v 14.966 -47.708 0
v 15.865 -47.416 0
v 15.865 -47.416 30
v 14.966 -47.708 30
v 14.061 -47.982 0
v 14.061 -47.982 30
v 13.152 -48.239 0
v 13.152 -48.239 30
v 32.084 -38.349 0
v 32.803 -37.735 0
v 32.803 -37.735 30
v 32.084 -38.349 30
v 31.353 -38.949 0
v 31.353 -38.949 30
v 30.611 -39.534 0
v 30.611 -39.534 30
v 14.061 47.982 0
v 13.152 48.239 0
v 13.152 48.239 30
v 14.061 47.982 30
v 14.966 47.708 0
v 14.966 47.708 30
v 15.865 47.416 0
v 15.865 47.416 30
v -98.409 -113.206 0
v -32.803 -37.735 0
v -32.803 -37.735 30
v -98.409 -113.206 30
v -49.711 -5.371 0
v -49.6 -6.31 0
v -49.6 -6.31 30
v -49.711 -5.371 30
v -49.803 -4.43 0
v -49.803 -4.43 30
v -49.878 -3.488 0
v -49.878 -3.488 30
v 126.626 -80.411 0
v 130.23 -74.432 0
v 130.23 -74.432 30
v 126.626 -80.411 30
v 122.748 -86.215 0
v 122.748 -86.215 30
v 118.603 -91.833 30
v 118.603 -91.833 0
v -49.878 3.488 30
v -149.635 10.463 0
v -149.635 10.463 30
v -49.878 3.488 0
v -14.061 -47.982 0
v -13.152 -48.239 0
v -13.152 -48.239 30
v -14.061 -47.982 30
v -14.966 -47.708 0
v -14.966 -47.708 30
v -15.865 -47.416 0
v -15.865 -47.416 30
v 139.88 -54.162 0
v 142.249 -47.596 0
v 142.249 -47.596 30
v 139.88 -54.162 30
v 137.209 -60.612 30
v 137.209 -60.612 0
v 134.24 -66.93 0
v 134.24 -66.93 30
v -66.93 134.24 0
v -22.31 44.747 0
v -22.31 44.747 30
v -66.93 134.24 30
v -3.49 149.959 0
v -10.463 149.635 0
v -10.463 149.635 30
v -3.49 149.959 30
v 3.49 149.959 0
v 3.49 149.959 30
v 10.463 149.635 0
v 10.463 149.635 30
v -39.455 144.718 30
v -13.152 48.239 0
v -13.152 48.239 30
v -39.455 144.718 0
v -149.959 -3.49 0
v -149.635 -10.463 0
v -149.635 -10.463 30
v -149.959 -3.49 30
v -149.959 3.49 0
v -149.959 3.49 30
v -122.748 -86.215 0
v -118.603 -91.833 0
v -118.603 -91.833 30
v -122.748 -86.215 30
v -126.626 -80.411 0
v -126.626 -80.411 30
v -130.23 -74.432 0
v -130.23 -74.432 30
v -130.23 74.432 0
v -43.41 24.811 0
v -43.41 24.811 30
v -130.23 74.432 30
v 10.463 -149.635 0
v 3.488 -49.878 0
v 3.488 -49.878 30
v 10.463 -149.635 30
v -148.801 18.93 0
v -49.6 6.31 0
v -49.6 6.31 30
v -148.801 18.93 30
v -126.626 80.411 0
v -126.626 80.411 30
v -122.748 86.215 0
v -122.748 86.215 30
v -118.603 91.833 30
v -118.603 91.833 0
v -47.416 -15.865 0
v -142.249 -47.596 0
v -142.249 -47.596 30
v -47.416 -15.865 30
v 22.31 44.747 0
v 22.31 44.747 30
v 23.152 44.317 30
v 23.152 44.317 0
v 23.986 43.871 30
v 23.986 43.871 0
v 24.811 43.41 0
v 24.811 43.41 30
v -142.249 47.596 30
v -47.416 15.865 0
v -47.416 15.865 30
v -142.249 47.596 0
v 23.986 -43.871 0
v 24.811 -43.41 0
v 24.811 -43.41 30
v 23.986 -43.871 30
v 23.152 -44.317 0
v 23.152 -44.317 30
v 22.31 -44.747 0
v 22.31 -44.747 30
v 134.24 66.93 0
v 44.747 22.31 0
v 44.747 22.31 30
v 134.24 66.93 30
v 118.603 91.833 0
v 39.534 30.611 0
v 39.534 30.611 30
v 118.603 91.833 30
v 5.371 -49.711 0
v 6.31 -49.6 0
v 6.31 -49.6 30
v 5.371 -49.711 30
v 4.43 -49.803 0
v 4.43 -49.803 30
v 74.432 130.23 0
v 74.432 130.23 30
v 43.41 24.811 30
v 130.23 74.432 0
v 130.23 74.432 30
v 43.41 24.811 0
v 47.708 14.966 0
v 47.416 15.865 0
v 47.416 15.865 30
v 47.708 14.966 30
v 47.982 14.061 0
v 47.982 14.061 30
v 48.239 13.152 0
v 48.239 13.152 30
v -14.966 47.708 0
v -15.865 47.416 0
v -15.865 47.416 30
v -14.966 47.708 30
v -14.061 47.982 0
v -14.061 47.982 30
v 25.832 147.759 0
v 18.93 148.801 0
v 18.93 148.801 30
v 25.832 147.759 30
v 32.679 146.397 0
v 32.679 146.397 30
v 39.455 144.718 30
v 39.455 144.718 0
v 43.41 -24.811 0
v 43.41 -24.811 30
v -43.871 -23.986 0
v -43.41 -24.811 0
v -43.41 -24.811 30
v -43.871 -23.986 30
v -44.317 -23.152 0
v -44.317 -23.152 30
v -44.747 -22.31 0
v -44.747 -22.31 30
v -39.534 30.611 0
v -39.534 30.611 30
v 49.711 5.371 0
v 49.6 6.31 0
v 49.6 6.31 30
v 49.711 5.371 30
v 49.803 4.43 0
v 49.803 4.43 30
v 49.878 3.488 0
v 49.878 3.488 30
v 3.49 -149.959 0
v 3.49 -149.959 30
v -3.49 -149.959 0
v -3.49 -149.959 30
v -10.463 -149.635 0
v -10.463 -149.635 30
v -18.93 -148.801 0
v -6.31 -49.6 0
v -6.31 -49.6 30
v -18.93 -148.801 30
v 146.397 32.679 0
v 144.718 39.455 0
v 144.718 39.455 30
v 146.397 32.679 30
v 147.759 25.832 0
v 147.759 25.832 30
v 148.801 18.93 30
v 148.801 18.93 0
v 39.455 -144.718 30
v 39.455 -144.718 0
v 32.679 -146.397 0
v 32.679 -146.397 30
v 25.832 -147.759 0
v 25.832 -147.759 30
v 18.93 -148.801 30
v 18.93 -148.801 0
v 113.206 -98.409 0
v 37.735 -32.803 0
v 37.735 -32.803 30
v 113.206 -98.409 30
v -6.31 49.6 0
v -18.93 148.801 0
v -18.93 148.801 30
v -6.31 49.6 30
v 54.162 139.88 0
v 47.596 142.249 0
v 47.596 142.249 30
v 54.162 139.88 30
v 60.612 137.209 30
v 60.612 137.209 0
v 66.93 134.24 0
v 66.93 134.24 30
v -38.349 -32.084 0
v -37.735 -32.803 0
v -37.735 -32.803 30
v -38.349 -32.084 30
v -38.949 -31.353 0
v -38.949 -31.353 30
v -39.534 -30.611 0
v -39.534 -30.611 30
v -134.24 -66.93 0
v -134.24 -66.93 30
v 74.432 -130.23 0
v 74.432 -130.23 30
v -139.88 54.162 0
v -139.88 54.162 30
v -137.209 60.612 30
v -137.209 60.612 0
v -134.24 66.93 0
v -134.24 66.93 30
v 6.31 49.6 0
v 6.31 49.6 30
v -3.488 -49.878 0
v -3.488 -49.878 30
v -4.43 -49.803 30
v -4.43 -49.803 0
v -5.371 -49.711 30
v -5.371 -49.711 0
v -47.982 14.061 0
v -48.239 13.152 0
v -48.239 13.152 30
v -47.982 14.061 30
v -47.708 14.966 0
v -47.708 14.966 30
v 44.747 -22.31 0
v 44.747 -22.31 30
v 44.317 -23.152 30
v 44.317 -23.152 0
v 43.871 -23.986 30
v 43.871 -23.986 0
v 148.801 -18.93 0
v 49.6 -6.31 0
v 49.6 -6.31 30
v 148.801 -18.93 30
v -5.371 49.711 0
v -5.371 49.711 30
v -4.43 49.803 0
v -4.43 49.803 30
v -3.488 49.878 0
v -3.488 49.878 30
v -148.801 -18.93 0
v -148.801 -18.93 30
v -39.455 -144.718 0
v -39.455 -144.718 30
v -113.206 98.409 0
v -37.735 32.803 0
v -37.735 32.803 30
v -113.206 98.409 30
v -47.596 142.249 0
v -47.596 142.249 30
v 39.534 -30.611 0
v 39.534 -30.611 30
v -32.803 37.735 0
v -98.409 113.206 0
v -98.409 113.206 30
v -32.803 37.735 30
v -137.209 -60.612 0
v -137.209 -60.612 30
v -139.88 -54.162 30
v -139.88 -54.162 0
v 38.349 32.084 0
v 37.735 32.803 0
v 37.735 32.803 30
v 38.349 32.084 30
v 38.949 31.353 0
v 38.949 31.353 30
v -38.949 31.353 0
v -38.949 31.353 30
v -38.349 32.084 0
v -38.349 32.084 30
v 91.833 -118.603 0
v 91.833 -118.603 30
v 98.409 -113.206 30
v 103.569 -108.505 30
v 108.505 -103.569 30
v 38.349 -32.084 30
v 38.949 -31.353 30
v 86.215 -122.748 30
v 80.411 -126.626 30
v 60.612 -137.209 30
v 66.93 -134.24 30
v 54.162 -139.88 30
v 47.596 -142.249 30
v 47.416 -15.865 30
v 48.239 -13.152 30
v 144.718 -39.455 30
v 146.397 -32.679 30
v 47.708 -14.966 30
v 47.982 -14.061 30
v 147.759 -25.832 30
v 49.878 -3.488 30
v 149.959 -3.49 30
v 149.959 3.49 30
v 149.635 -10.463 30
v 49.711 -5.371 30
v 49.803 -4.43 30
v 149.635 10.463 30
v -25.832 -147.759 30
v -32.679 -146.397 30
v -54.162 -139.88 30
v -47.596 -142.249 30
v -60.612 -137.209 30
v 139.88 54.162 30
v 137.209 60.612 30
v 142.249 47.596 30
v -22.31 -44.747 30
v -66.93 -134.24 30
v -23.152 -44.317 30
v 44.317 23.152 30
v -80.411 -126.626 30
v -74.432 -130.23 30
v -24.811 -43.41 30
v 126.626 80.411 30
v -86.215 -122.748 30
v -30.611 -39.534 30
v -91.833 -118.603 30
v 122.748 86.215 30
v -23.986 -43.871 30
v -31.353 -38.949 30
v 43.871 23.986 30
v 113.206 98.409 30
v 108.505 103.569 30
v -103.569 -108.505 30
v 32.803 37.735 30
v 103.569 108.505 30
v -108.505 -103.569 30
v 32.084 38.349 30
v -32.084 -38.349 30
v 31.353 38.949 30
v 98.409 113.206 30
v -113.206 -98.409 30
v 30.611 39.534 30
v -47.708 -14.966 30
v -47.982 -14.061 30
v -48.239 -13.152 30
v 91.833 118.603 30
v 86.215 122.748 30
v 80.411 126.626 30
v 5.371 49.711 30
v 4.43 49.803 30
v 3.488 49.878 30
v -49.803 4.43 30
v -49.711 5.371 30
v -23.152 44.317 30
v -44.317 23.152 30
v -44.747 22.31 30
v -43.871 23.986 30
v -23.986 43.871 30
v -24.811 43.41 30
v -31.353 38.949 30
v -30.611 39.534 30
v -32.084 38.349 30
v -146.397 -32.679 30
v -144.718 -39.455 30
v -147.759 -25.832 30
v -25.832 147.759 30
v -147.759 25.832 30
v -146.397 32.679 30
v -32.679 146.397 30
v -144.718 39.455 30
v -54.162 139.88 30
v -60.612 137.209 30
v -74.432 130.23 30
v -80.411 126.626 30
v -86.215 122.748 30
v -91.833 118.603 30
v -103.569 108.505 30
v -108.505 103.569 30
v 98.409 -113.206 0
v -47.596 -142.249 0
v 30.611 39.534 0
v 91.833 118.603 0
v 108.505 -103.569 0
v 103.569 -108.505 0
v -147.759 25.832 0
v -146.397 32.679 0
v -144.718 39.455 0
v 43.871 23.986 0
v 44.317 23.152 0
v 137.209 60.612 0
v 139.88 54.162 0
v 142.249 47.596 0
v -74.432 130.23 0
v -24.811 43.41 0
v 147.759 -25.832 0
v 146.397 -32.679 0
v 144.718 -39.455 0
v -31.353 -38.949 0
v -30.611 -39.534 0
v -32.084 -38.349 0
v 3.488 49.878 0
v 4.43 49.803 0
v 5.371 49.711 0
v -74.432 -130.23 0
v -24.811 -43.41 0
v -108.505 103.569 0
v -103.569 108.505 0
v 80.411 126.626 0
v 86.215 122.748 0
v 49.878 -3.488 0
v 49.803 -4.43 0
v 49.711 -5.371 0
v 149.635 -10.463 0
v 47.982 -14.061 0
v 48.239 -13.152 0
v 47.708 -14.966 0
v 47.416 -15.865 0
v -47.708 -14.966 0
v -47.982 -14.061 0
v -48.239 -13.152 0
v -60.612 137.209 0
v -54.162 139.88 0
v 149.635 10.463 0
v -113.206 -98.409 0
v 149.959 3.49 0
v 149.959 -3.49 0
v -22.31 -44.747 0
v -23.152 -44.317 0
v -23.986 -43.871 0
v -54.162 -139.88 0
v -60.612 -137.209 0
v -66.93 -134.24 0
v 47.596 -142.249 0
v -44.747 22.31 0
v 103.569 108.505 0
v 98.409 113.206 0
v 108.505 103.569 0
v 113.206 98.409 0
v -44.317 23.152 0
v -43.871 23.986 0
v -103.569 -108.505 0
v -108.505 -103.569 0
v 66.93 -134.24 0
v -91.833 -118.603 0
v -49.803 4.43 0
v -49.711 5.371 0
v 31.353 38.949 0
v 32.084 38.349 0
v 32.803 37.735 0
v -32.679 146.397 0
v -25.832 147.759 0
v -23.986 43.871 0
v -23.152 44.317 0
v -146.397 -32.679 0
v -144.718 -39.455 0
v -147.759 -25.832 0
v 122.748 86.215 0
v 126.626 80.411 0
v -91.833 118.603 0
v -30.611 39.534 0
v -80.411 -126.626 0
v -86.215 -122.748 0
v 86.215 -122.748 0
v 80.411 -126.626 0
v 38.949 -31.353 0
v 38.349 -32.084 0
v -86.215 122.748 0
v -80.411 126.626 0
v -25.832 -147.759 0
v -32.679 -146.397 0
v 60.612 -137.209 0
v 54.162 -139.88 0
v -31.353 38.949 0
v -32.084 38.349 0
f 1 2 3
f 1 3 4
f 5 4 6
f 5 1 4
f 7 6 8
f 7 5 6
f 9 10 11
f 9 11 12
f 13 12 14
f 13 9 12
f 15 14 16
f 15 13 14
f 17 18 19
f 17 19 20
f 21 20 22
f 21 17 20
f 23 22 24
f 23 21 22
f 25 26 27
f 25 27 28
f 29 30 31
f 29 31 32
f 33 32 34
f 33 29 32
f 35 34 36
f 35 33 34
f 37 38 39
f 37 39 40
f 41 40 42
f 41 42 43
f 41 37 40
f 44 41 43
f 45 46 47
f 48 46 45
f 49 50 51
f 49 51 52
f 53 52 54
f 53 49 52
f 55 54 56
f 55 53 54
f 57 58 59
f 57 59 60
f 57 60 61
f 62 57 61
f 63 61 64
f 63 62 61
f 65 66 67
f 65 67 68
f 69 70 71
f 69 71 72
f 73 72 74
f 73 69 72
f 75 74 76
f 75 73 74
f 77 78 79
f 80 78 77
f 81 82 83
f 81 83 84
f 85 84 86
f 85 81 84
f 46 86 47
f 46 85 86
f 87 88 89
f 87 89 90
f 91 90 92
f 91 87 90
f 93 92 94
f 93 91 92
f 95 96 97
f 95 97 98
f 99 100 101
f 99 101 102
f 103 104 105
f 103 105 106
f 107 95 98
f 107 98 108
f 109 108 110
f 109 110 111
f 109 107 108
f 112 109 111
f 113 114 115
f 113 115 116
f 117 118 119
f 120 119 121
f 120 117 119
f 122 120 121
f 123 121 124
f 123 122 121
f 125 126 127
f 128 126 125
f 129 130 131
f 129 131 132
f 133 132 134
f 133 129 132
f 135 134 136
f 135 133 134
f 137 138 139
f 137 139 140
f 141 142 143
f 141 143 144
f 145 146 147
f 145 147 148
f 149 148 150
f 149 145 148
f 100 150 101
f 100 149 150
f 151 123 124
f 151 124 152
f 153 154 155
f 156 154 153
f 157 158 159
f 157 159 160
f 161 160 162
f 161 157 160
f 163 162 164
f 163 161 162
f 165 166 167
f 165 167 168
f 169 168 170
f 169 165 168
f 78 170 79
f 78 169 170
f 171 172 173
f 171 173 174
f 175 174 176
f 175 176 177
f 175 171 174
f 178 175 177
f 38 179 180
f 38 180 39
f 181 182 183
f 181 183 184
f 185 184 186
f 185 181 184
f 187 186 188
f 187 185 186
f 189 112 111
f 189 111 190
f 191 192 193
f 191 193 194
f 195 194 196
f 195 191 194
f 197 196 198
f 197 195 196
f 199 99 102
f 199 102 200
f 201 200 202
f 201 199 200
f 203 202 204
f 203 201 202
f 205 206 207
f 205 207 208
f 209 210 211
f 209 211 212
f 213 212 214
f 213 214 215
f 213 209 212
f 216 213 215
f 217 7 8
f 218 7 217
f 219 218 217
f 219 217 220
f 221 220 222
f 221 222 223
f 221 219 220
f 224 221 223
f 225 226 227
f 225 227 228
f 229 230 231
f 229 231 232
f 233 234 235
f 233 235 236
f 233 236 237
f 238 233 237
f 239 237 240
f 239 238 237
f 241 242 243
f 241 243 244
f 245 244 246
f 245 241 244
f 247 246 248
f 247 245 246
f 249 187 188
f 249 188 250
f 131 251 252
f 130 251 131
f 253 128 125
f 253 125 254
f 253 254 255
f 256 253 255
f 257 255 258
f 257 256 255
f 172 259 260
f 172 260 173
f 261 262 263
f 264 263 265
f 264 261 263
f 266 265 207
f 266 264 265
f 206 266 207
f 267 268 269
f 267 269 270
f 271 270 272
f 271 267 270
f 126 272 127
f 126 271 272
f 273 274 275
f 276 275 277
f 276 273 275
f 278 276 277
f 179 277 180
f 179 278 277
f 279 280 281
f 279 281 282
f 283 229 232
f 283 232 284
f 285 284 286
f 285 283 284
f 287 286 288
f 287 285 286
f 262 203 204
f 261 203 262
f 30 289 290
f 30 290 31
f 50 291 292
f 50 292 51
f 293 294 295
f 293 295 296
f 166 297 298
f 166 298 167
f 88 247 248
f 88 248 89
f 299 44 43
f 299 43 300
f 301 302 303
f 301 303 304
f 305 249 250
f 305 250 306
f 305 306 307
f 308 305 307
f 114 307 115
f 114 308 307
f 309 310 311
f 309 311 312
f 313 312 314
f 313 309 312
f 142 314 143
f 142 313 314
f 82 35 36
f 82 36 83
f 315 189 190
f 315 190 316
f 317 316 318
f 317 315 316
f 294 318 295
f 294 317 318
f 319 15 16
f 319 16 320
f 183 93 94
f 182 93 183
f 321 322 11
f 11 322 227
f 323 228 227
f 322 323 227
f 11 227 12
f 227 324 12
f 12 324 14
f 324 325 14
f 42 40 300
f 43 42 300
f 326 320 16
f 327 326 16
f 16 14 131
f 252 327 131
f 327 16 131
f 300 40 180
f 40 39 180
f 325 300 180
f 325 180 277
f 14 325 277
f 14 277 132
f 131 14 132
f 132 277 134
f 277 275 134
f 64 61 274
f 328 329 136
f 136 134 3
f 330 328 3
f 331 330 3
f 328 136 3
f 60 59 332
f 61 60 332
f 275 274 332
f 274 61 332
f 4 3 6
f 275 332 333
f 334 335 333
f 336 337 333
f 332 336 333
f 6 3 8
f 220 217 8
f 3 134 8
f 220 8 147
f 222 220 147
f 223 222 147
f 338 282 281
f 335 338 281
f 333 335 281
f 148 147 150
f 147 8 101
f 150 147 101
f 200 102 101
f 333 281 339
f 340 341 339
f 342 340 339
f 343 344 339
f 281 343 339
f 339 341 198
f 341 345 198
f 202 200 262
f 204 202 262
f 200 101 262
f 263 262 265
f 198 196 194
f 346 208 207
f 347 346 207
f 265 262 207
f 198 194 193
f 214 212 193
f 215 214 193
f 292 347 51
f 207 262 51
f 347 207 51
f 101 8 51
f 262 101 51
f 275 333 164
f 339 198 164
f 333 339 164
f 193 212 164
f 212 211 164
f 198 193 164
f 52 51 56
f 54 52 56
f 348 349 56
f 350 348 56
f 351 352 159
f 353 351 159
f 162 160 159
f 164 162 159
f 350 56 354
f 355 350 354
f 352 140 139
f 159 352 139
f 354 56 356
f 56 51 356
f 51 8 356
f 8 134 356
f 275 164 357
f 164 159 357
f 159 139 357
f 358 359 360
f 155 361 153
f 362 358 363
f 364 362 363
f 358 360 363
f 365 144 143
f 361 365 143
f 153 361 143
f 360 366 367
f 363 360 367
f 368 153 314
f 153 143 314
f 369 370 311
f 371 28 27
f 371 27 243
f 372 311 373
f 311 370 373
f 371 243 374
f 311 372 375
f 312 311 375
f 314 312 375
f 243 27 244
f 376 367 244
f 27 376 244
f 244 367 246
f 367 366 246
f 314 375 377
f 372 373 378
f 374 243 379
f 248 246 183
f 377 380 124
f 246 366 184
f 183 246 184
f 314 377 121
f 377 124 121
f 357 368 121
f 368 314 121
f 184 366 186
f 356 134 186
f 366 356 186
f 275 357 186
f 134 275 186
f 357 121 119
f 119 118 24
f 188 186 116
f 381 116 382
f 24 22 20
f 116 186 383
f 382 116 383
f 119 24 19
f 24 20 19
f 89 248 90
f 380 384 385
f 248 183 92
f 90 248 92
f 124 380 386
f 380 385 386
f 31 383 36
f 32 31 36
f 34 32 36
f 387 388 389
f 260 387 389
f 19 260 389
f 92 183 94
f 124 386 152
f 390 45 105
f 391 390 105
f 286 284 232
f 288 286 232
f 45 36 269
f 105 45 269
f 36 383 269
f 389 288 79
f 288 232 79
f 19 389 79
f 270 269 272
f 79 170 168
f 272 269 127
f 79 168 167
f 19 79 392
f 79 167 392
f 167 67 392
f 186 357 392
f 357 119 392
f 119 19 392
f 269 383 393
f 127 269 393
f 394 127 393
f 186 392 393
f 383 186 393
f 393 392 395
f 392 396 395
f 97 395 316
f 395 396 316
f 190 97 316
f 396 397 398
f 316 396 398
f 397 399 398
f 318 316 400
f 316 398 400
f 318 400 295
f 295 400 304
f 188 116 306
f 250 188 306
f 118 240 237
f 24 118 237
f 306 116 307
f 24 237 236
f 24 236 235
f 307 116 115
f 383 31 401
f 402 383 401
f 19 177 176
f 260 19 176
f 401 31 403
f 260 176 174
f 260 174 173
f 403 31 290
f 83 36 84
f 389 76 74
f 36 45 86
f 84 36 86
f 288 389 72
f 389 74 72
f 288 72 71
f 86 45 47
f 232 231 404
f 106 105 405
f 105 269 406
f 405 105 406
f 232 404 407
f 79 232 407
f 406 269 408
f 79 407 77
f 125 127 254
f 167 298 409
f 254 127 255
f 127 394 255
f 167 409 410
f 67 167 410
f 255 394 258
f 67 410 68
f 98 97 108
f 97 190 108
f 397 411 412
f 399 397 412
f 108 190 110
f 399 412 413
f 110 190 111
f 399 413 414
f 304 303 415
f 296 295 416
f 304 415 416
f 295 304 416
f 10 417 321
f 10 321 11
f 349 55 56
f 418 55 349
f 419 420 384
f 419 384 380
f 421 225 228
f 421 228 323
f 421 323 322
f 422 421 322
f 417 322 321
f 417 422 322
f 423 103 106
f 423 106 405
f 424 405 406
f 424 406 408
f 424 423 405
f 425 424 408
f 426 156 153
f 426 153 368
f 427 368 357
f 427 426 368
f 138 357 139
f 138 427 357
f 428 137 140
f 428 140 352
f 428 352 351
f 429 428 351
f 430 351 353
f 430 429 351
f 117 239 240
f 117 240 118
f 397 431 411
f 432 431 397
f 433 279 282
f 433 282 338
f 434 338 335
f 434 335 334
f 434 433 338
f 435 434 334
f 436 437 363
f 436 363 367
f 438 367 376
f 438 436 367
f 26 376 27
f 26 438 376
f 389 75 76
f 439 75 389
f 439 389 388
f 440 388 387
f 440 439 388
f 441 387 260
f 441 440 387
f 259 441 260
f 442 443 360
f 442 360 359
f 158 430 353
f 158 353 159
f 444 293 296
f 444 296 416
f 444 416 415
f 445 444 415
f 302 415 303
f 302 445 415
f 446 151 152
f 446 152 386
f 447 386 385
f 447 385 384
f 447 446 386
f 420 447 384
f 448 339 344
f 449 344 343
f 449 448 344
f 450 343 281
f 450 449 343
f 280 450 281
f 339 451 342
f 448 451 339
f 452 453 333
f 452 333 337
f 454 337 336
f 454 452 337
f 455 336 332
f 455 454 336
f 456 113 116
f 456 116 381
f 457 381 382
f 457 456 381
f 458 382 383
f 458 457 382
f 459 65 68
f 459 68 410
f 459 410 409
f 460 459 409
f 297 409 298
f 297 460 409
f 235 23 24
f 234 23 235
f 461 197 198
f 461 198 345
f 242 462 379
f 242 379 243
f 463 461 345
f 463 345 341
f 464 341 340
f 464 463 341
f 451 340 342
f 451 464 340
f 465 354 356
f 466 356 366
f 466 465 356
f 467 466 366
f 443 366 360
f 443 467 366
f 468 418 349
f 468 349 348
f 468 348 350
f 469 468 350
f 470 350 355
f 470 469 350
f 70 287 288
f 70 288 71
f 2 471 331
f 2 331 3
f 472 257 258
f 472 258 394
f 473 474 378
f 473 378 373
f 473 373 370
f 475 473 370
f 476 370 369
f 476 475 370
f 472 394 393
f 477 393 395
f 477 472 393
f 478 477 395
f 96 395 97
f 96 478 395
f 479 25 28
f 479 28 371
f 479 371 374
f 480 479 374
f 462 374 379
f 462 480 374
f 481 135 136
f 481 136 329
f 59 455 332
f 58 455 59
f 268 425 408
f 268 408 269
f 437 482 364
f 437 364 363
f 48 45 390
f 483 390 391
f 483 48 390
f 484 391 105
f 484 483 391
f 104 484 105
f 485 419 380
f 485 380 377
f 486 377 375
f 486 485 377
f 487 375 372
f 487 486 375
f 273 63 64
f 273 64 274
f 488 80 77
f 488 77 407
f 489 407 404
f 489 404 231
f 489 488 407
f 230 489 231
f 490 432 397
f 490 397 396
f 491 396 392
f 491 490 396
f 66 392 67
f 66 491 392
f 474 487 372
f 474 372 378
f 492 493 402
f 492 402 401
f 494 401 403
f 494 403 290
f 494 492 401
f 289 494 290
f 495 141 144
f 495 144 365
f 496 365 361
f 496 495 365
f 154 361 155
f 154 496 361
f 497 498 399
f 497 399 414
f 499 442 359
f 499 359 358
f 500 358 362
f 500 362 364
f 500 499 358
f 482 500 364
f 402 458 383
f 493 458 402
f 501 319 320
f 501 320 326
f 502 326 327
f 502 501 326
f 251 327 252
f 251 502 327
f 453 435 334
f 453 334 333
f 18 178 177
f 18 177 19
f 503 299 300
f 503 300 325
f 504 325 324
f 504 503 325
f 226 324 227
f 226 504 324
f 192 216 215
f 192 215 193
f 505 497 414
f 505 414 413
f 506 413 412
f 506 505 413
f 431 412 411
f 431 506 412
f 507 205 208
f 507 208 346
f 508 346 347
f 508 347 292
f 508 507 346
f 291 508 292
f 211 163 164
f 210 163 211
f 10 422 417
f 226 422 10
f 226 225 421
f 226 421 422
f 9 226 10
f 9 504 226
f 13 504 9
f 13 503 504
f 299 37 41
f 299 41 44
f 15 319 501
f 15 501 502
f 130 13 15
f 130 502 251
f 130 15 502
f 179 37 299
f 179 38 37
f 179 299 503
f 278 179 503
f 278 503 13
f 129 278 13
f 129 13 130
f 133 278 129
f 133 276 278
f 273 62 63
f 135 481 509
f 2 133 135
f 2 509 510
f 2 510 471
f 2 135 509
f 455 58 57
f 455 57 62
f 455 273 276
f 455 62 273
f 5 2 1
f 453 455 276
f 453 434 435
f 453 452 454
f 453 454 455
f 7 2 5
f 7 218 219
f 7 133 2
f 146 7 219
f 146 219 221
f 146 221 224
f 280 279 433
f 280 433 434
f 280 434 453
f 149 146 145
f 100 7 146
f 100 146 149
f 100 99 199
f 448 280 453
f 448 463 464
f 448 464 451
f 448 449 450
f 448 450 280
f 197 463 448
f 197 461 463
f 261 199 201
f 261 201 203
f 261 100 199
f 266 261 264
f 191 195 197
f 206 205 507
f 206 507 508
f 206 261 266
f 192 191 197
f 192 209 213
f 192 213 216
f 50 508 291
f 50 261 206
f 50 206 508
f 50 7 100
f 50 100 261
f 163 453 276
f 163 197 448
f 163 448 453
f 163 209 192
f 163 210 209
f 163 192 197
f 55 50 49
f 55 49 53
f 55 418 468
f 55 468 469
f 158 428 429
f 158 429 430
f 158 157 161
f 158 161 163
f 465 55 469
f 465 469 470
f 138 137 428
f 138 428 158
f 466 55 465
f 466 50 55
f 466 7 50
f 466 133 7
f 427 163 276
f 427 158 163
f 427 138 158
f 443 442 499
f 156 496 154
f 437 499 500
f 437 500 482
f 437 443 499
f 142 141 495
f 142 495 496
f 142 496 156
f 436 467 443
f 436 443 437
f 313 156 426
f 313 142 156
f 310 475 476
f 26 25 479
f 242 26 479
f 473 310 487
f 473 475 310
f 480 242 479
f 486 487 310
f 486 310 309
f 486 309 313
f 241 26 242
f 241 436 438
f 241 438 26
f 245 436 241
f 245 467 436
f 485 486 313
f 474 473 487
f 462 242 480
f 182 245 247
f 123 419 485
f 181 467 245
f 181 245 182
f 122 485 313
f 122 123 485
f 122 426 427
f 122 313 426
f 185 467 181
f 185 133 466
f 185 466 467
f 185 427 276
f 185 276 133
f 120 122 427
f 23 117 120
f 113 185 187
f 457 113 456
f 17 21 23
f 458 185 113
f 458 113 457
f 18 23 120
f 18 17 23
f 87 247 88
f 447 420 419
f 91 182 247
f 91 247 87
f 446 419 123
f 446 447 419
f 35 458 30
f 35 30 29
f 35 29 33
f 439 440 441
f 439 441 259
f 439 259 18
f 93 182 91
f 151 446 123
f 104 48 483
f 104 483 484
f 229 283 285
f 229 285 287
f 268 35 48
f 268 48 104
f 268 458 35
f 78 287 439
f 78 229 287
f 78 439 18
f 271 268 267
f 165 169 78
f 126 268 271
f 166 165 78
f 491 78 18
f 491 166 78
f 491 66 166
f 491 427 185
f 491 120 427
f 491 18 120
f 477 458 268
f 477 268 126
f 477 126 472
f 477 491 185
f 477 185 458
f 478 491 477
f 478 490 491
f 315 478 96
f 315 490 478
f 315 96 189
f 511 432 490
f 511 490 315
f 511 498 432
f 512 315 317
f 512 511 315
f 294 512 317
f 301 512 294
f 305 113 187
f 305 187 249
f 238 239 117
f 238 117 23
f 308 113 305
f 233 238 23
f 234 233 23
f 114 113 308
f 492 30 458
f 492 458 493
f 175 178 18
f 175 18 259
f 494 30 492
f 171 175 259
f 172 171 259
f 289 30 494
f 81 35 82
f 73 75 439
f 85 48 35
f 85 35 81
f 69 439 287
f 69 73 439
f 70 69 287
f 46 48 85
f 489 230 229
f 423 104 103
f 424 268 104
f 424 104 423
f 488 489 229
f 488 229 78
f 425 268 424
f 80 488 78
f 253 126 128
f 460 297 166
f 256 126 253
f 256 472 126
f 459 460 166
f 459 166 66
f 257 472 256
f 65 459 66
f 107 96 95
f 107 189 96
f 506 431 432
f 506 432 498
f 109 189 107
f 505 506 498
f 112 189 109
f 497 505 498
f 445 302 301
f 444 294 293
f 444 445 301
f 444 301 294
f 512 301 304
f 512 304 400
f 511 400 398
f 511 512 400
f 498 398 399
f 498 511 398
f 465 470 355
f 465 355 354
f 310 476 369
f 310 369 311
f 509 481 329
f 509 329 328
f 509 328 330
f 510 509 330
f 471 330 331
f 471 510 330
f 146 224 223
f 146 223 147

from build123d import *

# Parameters (mm, degrees)
BOSS_EXTRUDE1_DEPTH = 30


with BuildPart() as part:
    # Sketch1 → Boss-Extrude1 (new body)
    with BuildSketch(Plane.XY):
        with BuildLine():
            Line((-3.487823687, 49.878202513), (-10.463471062, 149.634607539))
            ThreePointArc((-10.463471062, 149.634607539), (0, 150), (10.463471062, 149.634607539))
            Line((10.463471062, 149.634607539), (3.487823687, 49.878202513))
            ThreePointArc((3.487823687, 49.878202513), (4.900857016, 49.759236334), (6.309948457, 49.600247484))
            Line((6.309948457, 49.600247484), (18.92984537, 148.800742452))
            ThreePointArc((18.92984537, 148.800742452), (29.263548302, 147.11779206), (39.454682169, 144.718098574))
            Line((39.454682169, 144.718098574), (13.151560723, 48.239366191))
            ThreePointArc((13.151560723, 48.239366191), (14.514233863, 47.847016787), (15.86523282, 47.41618276))
            Line((15.86523282, 47.41618276), (47.595698461, 142.248548281))
            ThreePointArc((47.595698461, 142.248548281), (57.402514855, 138.581929877), (66.929671966, 134.24015424))
            Line((66.929671966, 134.24015424), (22.309890655, 44.74671808))
            ThreePointArc((22.309890655, 44.74671808), (23.569836841, 44.096063217), (24.810825184, 43.409940724))
            Line((24.810825184, 43.409940724), (74.432475551, 130.229822173))
            ThreePointArc((74.432475551, 130.229822173), (83.335534953, 124.720441845), (91.832592005, 118.603436062))
            Line((91.832592005, 118.603436062), (30.610864002, 39.534478687))
            ThreePointArc((30.610864002, 39.534478687), (31.719664208, 38.650522668), (32.80295145, 37.735479011))
            Line((32.80295145, 37.735479011), (98.408854349, 113.206437033))
            ThreePointArc((98.408854349, 113.206437033), (106.066017178, 106.066017178), (113.206437033, 98.408854349))
            Line((113.206437033, 98.408854349), (37.735479011, 32.80295145))
            ThreePointArc((37.735479011, 32.80295145), (38.650522668, 31.719664208), (39.534478687, 30.610864002))
            Line((39.534478687, 30.610864002), (118.603436062, 91.832592005))
            ThreePointArc((118.603436062, 91.832592005), (124.720441845, 83.335534953), (130.229822173, 74.432475551))
            Line((130.229822173, 74.432475551), (43.409940724, 24.810825184))
            ThreePointArc((43.409940724, 24.810825184), (44.096063217, 23.569836841), (44.74671808, 22.309890655))
            Line((44.74671808, 22.309890655), (134.24015424, 66.929671966))
            ThreePointArc((134.24015424, 66.929671966), (138.581929877, 57.402514855), (142.248548281, 47.595698461))
            Line((142.248548281, 47.595698461), (47.41618276, 15.86523282))
            ThreePointArc((47.41618276, 15.86523282), (47.847016787, 14.514233863), (48.239366191, 13.151560723))
            Line((48.239366191, 13.151560723), (144.718098574, 39.454682169))
            ThreePointArc((144.718098574, 39.454682169), (147.11779206, 29.263548302), (148.800742452, 18.92984537))
            Line((148.800742452, 18.92984537), (49.600247484, 6.309948457))
            ThreePointArc((49.600247484, 6.309948457), (49.759236334, 4.900857016), (49.878202513, 3.487823687))
            Line((49.878202513, 3.487823687), (149.634607539, 10.463471062))
            ThreePointArc((149.634607539, 10.463471062), (150, 0), (149.634607539, -10.463471062))
            Line((149.634607539, -10.463471062), (49.878202513, -3.487823687))
            ThreePointArc((49.878202513, -3.487823687), (49.759236334, -4.900857016), (49.600247484, -6.309948457))
            Line((49.600247484, -6.309948457), (148.800742452, -18.92984537))
            ThreePointArc((148.800742452, -18.92984537), (147.11779206, -29.263548302), (144.718098574, -39.454682169))
            Line((144.718098574, -39.454682169), (48.239366191, -13.151560723))
            ThreePointArc((48.239366191, -13.151560723), (47.847016787, -14.514233863), (47.41618276, -15.86523282))
            Line((47.41618276, -15.86523282), (142.248548281, -47.595698461))
            ThreePointArc((142.248548281, -47.595698461), (138.581929877, -57.402514855), (134.24015424, -66.929671966))
            Line((134.24015424, -66.929671966), (44.74671808, -22.309890655))
            ThreePointArc((44.74671808, -22.309890655), (44.096063217, -23.569836841), (43.409940724, -24.810825184))
            Line((43.409940724, -24.810825184), (130.229822173, -74.432475551))
            ThreePointArc((130.229822173, -74.432475551), (124.720441845, -83.335534953), (118.603436062, -91.832592005))
            Line((118.603436062, -91.832592005), (39.534478687, -30.610864002))
            ThreePointArc((39.534478687, -30.610864002), (38.650522668, -31.719664208), (37.735479011, -32.80295145))
            Line((37.735479011, -32.80295145), (113.206437033, -98.408854349))
            ThreePointArc((113.206437033, -98.408854349), (106.066017178, -106.066017178), (98.408854349, -113.206437033))
            Line((98.408854349, -113.206437033), (32.80295145, -37.735479011))
            ThreePointArc((32.80295145, -37.735479011), (31.719664208, -38.650522668), (30.610864002, -39.534478687))
            Line((30.610864002, -39.534478687), (91.832592005, -118.603436062))
            ThreePointArc((91.832592005, -118.603436062), (83.335534953, -124.720441845), (74.432475551, -130.229822173))
            Line((74.432475551, -130.229822173), (24.810825184, -43.409940724))
            ThreePointArc((24.810825184, -43.409940724), (23.569836841, -44.096063217), (22.309890655, -44.74671808))
            Line((22.309890655, -44.74671808), (66.929671966, -134.24015424))
            ThreePointArc((66.929671966, -134.24015424), (57.402514855, -138.581929877), (47.595698461, -142.248548281))
            Line((47.595698461, -142.248548281), (15.86523282, -47.41618276))
            ThreePointArc((15.86523282, -47.41618276), (14.514233863, -47.847016787), (13.151560723, -48.239366191))
            Line((13.151560723, -48.239366191), (39.454682169, -144.718098574))
            ThreePointArc((39.454682169, -144.718098574), (29.263548302, -147.11779206), (18.92984537, -148.800742452))
            Line((18.92984537, -148.800742452), (6.309948457, -49.600247484))
            ThreePointArc((6.309948457, -49.600247484), (4.900857016, -49.759236334), (3.487823687, -49.878202513))
            Line((3.487823687, -49.878202513), (10.463471062, -149.634607539))
            ThreePointArc((10.463471062, -149.634607539), (0, -150), (-10.463471062, -149.634607539))
            Line((-10.463471062, -149.634607539), (-3.487823687, -49.878202513))
            ThreePointArc((-3.487823687, -49.878202513), (-4.900857016, -49.759236334), (-6.309948457, -49.600247484))
            Line((-6.309948457, -49.600247484), (-18.92984537, -148.800742452))
            ThreePointArc((-18.92984537, -148.800742452), (-29.263548302, -147.11779206), (-39.454682169, -144.718098574))
            Line((-39.454682169, -144.718098574), (-13.151560723, -48.239366191))
            ThreePointArc((-13.151560723, -48.239366191), (-14.514233863, -47.847016787), (-15.86523282, -47.41618276))
            Line((-15.86523282, -47.41618276), (-47.595698461, -142.248548281))
            ThreePointArc((-47.595698461, -142.248548281), (-57.402514855, -138.581929877), (-66.929671966, -134.24015424))
            Line((-66.929671966, -134.24015424), (-22.309890655, -44.74671808))
            ThreePointArc((-22.309890655, -44.74671808), (-23.569836841, -44.096063217), (-24.810825184, -43.409940724))
            Line((-24.810825184, -43.409940724), (-74.432475551, -130.229822173))
            ThreePointArc((-74.432475551, -130.229822173), (-83.335534953, -124.720441845), (-91.832592005, -118.603436062))
            Line((-91.832592005, -118.603436062), (-30.610864002, -39.534478687))
            ThreePointArc((-30.610864002, -39.534478687), (-31.719664208, -38.650522668), (-32.80295145, -37.735479011))
            Line((-32.80295145, -37.735479011), (-98.408854349, -113.206437033))
            ThreePointArc((-98.408854349, -113.206437033), (-106.066017178, -106.066017178), (-113.206437033, -98.408854349))
            Line((-113.206437033, -98.408854349), (-37.735479011, -32.80295145))
            ThreePointArc((-37.735479011, -32.80295145), (-38.650522668, -31.719664208), (-39.534478687, -30.610864002))
            Line((-39.534478687, -30.610864002), (-118.603436062, -91.832592005))
            ThreePointArc((-118.603436062, -91.832592005), (-124.720441845, -83.335534953), (-130.229822173, -74.432475551))
            Line((-130.229822173, -74.432475551), (-43.409940724, -24.810825184))
            ThreePointArc((-43.409940724, -24.810825184), (-44.096063217, -23.569836841), (-44.74671808, -22.309890655))
            Line((-44.74671808, -22.309890655), (-134.24015424, -66.929671966))
            ThreePointArc((-134.24015424, -66.929671966), (-138.581929877, -57.402514855), (-142.248548281, -47.595698461))
            Line((-142.248548281, -47.595698461), (-47.41618276, -15.86523282))
            ThreePointArc((-47.41618276, -15.86523282), (-47.847016787, -14.514233863), (-48.239366191, -13.151560723))
            Line((-48.239366191, -13.151560723), (-144.718098574, -39.454682169))
            ThreePointArc((-144.718098574, -39.454682169), (-147.11779206, -29.263548302), (-148.800742452, -18.92984537))
            Line((-148.800742452, -18.92984537), (-49.600247484, -6.309948457))
            ThreePointArc((-49.600247484, -6.309948457), (-49.759236334, -4.900857016), (-49.878202513, -3.487823687))
            Line((-49.878202513, -3.487823687), (-149.634607539, -10.463471062))
            ThreePointArc((-149.634607539, -10.463471062), (-150, 0), (-149.634607539, 10.463471062))
            Line((-149.634607539, 10.463471062), (-49.878202513, 3.487823687))
            ThreePointArc((-49.878202513, 3.487823687), (-49.759236334, 4.900857016), (-49.600247484, 6.309948457))
            Line((-49.600247484, 6.309948457), (-148.800742452, 18.92984537))
            ThreePointArc((-148.800742452, 18.92984537), (-147.11779206, 29.263548302), (-144.718098574, 39.454682169))
            Line((-144.718098574, 39.454682169), (-48.239366191, 13.151560723))
            ThreePointArc((-48.239366191, 13.151560723), (-47.847016787, 14.514233863), (-47.41618276, 15.86523282))
            Line((-47.41618276, 15.86523282), (-142.248548281, 47.595698461))
            ThreePointArc((-142.248548281, 47.595698461), (-138.581929877, 57.402514855), (-134.24015424, 66.929671966))
            Line((-134.24015424, 66.929671966), (-44.74671808, 22.309890655))
            ThreePointArc((-44.74671808, 22.309890655), (-44.096063217, 23.569836841), (-43.409940724, 24.810825184))
            Line((-43.409940724, 24.810825184), (-130.229822173, 74.432475551))
            ThreePointArc((-130.229822173, 74.432475551), (-124.720441845, 83.335534953), (-118.603436062, 91.832592005))
            Line((-118.603436062, 91.832592005), (-39.534478687, 30.610864002))
            ThreePointArc((-39.534478687, 30.610864002), (-38.650522668, 31.719664208), (-37.735479011, 32.80295145))
            Line((-37.735479011, 32.80295145), (-113.206437033, 98.408854349))
            ThreePointArc((-113.206437033, 98.408854349), (-106.066017178, 106.066017178), (-98.408854349, 113.206437033))
            Line((-98.408854349, 113.206437033), (-32.80295145, 37.735479011))
            ThreePointArc((-32.80295145, 37.735479011), (-31.719664208, 38.650522668), (-30.610864002, 39.534478687))
            Line((-30.610864002, 39.534478687), (-91.832592005, 118.603436062))
            ThreePointArc((-91.832592005, 118.603436062), (-83.335534953, 124.720441845), (-74.432475551, 130.229822173))
            Line((-74.432475551, 130.229822173), (-24.810825184, 43.409940724))
            ThreePointArc((-24.810825184, 43.409940724), (-23.569836841, 44.096063217), (-22.309890655, 44.74671808))
            Line((-22.309890655, 44.74671808), (-66.929671966, 134.24015424))
            ThreePointArc((-66.929671966, 134.24015424), (-57.402514855, 138.581929877), (-47.595698461, 142.248548281))
            Line((-47.595698461, 142.248548281), (-15.86523282, 47.41618276))
            ThreePointArc((-15.86523282, 47.41618276), (-14.514233863, 47.847016787), (-13.151560723, 48.239366191))
            Line((-13.151560723, 48.239366191), (-39.454682169, 144.718098574))
            ThreePointArc((-39.454682169, 144.718098574), (-29.263548302, 147.11779206), (-18.92984537, 148.800742452))
            Line((-18.92984537, 148.800742452), (-6.309948457, 49.600247484))
            ThreePointArc((-6.309948457, 49.600247484), (-4.900857016, 49.759236334), (-3.487823687, 49.878202513))
        make_face()
    extrude(amount=BOSS_EXTRUDE1_DEPTH)


solid = part.part
